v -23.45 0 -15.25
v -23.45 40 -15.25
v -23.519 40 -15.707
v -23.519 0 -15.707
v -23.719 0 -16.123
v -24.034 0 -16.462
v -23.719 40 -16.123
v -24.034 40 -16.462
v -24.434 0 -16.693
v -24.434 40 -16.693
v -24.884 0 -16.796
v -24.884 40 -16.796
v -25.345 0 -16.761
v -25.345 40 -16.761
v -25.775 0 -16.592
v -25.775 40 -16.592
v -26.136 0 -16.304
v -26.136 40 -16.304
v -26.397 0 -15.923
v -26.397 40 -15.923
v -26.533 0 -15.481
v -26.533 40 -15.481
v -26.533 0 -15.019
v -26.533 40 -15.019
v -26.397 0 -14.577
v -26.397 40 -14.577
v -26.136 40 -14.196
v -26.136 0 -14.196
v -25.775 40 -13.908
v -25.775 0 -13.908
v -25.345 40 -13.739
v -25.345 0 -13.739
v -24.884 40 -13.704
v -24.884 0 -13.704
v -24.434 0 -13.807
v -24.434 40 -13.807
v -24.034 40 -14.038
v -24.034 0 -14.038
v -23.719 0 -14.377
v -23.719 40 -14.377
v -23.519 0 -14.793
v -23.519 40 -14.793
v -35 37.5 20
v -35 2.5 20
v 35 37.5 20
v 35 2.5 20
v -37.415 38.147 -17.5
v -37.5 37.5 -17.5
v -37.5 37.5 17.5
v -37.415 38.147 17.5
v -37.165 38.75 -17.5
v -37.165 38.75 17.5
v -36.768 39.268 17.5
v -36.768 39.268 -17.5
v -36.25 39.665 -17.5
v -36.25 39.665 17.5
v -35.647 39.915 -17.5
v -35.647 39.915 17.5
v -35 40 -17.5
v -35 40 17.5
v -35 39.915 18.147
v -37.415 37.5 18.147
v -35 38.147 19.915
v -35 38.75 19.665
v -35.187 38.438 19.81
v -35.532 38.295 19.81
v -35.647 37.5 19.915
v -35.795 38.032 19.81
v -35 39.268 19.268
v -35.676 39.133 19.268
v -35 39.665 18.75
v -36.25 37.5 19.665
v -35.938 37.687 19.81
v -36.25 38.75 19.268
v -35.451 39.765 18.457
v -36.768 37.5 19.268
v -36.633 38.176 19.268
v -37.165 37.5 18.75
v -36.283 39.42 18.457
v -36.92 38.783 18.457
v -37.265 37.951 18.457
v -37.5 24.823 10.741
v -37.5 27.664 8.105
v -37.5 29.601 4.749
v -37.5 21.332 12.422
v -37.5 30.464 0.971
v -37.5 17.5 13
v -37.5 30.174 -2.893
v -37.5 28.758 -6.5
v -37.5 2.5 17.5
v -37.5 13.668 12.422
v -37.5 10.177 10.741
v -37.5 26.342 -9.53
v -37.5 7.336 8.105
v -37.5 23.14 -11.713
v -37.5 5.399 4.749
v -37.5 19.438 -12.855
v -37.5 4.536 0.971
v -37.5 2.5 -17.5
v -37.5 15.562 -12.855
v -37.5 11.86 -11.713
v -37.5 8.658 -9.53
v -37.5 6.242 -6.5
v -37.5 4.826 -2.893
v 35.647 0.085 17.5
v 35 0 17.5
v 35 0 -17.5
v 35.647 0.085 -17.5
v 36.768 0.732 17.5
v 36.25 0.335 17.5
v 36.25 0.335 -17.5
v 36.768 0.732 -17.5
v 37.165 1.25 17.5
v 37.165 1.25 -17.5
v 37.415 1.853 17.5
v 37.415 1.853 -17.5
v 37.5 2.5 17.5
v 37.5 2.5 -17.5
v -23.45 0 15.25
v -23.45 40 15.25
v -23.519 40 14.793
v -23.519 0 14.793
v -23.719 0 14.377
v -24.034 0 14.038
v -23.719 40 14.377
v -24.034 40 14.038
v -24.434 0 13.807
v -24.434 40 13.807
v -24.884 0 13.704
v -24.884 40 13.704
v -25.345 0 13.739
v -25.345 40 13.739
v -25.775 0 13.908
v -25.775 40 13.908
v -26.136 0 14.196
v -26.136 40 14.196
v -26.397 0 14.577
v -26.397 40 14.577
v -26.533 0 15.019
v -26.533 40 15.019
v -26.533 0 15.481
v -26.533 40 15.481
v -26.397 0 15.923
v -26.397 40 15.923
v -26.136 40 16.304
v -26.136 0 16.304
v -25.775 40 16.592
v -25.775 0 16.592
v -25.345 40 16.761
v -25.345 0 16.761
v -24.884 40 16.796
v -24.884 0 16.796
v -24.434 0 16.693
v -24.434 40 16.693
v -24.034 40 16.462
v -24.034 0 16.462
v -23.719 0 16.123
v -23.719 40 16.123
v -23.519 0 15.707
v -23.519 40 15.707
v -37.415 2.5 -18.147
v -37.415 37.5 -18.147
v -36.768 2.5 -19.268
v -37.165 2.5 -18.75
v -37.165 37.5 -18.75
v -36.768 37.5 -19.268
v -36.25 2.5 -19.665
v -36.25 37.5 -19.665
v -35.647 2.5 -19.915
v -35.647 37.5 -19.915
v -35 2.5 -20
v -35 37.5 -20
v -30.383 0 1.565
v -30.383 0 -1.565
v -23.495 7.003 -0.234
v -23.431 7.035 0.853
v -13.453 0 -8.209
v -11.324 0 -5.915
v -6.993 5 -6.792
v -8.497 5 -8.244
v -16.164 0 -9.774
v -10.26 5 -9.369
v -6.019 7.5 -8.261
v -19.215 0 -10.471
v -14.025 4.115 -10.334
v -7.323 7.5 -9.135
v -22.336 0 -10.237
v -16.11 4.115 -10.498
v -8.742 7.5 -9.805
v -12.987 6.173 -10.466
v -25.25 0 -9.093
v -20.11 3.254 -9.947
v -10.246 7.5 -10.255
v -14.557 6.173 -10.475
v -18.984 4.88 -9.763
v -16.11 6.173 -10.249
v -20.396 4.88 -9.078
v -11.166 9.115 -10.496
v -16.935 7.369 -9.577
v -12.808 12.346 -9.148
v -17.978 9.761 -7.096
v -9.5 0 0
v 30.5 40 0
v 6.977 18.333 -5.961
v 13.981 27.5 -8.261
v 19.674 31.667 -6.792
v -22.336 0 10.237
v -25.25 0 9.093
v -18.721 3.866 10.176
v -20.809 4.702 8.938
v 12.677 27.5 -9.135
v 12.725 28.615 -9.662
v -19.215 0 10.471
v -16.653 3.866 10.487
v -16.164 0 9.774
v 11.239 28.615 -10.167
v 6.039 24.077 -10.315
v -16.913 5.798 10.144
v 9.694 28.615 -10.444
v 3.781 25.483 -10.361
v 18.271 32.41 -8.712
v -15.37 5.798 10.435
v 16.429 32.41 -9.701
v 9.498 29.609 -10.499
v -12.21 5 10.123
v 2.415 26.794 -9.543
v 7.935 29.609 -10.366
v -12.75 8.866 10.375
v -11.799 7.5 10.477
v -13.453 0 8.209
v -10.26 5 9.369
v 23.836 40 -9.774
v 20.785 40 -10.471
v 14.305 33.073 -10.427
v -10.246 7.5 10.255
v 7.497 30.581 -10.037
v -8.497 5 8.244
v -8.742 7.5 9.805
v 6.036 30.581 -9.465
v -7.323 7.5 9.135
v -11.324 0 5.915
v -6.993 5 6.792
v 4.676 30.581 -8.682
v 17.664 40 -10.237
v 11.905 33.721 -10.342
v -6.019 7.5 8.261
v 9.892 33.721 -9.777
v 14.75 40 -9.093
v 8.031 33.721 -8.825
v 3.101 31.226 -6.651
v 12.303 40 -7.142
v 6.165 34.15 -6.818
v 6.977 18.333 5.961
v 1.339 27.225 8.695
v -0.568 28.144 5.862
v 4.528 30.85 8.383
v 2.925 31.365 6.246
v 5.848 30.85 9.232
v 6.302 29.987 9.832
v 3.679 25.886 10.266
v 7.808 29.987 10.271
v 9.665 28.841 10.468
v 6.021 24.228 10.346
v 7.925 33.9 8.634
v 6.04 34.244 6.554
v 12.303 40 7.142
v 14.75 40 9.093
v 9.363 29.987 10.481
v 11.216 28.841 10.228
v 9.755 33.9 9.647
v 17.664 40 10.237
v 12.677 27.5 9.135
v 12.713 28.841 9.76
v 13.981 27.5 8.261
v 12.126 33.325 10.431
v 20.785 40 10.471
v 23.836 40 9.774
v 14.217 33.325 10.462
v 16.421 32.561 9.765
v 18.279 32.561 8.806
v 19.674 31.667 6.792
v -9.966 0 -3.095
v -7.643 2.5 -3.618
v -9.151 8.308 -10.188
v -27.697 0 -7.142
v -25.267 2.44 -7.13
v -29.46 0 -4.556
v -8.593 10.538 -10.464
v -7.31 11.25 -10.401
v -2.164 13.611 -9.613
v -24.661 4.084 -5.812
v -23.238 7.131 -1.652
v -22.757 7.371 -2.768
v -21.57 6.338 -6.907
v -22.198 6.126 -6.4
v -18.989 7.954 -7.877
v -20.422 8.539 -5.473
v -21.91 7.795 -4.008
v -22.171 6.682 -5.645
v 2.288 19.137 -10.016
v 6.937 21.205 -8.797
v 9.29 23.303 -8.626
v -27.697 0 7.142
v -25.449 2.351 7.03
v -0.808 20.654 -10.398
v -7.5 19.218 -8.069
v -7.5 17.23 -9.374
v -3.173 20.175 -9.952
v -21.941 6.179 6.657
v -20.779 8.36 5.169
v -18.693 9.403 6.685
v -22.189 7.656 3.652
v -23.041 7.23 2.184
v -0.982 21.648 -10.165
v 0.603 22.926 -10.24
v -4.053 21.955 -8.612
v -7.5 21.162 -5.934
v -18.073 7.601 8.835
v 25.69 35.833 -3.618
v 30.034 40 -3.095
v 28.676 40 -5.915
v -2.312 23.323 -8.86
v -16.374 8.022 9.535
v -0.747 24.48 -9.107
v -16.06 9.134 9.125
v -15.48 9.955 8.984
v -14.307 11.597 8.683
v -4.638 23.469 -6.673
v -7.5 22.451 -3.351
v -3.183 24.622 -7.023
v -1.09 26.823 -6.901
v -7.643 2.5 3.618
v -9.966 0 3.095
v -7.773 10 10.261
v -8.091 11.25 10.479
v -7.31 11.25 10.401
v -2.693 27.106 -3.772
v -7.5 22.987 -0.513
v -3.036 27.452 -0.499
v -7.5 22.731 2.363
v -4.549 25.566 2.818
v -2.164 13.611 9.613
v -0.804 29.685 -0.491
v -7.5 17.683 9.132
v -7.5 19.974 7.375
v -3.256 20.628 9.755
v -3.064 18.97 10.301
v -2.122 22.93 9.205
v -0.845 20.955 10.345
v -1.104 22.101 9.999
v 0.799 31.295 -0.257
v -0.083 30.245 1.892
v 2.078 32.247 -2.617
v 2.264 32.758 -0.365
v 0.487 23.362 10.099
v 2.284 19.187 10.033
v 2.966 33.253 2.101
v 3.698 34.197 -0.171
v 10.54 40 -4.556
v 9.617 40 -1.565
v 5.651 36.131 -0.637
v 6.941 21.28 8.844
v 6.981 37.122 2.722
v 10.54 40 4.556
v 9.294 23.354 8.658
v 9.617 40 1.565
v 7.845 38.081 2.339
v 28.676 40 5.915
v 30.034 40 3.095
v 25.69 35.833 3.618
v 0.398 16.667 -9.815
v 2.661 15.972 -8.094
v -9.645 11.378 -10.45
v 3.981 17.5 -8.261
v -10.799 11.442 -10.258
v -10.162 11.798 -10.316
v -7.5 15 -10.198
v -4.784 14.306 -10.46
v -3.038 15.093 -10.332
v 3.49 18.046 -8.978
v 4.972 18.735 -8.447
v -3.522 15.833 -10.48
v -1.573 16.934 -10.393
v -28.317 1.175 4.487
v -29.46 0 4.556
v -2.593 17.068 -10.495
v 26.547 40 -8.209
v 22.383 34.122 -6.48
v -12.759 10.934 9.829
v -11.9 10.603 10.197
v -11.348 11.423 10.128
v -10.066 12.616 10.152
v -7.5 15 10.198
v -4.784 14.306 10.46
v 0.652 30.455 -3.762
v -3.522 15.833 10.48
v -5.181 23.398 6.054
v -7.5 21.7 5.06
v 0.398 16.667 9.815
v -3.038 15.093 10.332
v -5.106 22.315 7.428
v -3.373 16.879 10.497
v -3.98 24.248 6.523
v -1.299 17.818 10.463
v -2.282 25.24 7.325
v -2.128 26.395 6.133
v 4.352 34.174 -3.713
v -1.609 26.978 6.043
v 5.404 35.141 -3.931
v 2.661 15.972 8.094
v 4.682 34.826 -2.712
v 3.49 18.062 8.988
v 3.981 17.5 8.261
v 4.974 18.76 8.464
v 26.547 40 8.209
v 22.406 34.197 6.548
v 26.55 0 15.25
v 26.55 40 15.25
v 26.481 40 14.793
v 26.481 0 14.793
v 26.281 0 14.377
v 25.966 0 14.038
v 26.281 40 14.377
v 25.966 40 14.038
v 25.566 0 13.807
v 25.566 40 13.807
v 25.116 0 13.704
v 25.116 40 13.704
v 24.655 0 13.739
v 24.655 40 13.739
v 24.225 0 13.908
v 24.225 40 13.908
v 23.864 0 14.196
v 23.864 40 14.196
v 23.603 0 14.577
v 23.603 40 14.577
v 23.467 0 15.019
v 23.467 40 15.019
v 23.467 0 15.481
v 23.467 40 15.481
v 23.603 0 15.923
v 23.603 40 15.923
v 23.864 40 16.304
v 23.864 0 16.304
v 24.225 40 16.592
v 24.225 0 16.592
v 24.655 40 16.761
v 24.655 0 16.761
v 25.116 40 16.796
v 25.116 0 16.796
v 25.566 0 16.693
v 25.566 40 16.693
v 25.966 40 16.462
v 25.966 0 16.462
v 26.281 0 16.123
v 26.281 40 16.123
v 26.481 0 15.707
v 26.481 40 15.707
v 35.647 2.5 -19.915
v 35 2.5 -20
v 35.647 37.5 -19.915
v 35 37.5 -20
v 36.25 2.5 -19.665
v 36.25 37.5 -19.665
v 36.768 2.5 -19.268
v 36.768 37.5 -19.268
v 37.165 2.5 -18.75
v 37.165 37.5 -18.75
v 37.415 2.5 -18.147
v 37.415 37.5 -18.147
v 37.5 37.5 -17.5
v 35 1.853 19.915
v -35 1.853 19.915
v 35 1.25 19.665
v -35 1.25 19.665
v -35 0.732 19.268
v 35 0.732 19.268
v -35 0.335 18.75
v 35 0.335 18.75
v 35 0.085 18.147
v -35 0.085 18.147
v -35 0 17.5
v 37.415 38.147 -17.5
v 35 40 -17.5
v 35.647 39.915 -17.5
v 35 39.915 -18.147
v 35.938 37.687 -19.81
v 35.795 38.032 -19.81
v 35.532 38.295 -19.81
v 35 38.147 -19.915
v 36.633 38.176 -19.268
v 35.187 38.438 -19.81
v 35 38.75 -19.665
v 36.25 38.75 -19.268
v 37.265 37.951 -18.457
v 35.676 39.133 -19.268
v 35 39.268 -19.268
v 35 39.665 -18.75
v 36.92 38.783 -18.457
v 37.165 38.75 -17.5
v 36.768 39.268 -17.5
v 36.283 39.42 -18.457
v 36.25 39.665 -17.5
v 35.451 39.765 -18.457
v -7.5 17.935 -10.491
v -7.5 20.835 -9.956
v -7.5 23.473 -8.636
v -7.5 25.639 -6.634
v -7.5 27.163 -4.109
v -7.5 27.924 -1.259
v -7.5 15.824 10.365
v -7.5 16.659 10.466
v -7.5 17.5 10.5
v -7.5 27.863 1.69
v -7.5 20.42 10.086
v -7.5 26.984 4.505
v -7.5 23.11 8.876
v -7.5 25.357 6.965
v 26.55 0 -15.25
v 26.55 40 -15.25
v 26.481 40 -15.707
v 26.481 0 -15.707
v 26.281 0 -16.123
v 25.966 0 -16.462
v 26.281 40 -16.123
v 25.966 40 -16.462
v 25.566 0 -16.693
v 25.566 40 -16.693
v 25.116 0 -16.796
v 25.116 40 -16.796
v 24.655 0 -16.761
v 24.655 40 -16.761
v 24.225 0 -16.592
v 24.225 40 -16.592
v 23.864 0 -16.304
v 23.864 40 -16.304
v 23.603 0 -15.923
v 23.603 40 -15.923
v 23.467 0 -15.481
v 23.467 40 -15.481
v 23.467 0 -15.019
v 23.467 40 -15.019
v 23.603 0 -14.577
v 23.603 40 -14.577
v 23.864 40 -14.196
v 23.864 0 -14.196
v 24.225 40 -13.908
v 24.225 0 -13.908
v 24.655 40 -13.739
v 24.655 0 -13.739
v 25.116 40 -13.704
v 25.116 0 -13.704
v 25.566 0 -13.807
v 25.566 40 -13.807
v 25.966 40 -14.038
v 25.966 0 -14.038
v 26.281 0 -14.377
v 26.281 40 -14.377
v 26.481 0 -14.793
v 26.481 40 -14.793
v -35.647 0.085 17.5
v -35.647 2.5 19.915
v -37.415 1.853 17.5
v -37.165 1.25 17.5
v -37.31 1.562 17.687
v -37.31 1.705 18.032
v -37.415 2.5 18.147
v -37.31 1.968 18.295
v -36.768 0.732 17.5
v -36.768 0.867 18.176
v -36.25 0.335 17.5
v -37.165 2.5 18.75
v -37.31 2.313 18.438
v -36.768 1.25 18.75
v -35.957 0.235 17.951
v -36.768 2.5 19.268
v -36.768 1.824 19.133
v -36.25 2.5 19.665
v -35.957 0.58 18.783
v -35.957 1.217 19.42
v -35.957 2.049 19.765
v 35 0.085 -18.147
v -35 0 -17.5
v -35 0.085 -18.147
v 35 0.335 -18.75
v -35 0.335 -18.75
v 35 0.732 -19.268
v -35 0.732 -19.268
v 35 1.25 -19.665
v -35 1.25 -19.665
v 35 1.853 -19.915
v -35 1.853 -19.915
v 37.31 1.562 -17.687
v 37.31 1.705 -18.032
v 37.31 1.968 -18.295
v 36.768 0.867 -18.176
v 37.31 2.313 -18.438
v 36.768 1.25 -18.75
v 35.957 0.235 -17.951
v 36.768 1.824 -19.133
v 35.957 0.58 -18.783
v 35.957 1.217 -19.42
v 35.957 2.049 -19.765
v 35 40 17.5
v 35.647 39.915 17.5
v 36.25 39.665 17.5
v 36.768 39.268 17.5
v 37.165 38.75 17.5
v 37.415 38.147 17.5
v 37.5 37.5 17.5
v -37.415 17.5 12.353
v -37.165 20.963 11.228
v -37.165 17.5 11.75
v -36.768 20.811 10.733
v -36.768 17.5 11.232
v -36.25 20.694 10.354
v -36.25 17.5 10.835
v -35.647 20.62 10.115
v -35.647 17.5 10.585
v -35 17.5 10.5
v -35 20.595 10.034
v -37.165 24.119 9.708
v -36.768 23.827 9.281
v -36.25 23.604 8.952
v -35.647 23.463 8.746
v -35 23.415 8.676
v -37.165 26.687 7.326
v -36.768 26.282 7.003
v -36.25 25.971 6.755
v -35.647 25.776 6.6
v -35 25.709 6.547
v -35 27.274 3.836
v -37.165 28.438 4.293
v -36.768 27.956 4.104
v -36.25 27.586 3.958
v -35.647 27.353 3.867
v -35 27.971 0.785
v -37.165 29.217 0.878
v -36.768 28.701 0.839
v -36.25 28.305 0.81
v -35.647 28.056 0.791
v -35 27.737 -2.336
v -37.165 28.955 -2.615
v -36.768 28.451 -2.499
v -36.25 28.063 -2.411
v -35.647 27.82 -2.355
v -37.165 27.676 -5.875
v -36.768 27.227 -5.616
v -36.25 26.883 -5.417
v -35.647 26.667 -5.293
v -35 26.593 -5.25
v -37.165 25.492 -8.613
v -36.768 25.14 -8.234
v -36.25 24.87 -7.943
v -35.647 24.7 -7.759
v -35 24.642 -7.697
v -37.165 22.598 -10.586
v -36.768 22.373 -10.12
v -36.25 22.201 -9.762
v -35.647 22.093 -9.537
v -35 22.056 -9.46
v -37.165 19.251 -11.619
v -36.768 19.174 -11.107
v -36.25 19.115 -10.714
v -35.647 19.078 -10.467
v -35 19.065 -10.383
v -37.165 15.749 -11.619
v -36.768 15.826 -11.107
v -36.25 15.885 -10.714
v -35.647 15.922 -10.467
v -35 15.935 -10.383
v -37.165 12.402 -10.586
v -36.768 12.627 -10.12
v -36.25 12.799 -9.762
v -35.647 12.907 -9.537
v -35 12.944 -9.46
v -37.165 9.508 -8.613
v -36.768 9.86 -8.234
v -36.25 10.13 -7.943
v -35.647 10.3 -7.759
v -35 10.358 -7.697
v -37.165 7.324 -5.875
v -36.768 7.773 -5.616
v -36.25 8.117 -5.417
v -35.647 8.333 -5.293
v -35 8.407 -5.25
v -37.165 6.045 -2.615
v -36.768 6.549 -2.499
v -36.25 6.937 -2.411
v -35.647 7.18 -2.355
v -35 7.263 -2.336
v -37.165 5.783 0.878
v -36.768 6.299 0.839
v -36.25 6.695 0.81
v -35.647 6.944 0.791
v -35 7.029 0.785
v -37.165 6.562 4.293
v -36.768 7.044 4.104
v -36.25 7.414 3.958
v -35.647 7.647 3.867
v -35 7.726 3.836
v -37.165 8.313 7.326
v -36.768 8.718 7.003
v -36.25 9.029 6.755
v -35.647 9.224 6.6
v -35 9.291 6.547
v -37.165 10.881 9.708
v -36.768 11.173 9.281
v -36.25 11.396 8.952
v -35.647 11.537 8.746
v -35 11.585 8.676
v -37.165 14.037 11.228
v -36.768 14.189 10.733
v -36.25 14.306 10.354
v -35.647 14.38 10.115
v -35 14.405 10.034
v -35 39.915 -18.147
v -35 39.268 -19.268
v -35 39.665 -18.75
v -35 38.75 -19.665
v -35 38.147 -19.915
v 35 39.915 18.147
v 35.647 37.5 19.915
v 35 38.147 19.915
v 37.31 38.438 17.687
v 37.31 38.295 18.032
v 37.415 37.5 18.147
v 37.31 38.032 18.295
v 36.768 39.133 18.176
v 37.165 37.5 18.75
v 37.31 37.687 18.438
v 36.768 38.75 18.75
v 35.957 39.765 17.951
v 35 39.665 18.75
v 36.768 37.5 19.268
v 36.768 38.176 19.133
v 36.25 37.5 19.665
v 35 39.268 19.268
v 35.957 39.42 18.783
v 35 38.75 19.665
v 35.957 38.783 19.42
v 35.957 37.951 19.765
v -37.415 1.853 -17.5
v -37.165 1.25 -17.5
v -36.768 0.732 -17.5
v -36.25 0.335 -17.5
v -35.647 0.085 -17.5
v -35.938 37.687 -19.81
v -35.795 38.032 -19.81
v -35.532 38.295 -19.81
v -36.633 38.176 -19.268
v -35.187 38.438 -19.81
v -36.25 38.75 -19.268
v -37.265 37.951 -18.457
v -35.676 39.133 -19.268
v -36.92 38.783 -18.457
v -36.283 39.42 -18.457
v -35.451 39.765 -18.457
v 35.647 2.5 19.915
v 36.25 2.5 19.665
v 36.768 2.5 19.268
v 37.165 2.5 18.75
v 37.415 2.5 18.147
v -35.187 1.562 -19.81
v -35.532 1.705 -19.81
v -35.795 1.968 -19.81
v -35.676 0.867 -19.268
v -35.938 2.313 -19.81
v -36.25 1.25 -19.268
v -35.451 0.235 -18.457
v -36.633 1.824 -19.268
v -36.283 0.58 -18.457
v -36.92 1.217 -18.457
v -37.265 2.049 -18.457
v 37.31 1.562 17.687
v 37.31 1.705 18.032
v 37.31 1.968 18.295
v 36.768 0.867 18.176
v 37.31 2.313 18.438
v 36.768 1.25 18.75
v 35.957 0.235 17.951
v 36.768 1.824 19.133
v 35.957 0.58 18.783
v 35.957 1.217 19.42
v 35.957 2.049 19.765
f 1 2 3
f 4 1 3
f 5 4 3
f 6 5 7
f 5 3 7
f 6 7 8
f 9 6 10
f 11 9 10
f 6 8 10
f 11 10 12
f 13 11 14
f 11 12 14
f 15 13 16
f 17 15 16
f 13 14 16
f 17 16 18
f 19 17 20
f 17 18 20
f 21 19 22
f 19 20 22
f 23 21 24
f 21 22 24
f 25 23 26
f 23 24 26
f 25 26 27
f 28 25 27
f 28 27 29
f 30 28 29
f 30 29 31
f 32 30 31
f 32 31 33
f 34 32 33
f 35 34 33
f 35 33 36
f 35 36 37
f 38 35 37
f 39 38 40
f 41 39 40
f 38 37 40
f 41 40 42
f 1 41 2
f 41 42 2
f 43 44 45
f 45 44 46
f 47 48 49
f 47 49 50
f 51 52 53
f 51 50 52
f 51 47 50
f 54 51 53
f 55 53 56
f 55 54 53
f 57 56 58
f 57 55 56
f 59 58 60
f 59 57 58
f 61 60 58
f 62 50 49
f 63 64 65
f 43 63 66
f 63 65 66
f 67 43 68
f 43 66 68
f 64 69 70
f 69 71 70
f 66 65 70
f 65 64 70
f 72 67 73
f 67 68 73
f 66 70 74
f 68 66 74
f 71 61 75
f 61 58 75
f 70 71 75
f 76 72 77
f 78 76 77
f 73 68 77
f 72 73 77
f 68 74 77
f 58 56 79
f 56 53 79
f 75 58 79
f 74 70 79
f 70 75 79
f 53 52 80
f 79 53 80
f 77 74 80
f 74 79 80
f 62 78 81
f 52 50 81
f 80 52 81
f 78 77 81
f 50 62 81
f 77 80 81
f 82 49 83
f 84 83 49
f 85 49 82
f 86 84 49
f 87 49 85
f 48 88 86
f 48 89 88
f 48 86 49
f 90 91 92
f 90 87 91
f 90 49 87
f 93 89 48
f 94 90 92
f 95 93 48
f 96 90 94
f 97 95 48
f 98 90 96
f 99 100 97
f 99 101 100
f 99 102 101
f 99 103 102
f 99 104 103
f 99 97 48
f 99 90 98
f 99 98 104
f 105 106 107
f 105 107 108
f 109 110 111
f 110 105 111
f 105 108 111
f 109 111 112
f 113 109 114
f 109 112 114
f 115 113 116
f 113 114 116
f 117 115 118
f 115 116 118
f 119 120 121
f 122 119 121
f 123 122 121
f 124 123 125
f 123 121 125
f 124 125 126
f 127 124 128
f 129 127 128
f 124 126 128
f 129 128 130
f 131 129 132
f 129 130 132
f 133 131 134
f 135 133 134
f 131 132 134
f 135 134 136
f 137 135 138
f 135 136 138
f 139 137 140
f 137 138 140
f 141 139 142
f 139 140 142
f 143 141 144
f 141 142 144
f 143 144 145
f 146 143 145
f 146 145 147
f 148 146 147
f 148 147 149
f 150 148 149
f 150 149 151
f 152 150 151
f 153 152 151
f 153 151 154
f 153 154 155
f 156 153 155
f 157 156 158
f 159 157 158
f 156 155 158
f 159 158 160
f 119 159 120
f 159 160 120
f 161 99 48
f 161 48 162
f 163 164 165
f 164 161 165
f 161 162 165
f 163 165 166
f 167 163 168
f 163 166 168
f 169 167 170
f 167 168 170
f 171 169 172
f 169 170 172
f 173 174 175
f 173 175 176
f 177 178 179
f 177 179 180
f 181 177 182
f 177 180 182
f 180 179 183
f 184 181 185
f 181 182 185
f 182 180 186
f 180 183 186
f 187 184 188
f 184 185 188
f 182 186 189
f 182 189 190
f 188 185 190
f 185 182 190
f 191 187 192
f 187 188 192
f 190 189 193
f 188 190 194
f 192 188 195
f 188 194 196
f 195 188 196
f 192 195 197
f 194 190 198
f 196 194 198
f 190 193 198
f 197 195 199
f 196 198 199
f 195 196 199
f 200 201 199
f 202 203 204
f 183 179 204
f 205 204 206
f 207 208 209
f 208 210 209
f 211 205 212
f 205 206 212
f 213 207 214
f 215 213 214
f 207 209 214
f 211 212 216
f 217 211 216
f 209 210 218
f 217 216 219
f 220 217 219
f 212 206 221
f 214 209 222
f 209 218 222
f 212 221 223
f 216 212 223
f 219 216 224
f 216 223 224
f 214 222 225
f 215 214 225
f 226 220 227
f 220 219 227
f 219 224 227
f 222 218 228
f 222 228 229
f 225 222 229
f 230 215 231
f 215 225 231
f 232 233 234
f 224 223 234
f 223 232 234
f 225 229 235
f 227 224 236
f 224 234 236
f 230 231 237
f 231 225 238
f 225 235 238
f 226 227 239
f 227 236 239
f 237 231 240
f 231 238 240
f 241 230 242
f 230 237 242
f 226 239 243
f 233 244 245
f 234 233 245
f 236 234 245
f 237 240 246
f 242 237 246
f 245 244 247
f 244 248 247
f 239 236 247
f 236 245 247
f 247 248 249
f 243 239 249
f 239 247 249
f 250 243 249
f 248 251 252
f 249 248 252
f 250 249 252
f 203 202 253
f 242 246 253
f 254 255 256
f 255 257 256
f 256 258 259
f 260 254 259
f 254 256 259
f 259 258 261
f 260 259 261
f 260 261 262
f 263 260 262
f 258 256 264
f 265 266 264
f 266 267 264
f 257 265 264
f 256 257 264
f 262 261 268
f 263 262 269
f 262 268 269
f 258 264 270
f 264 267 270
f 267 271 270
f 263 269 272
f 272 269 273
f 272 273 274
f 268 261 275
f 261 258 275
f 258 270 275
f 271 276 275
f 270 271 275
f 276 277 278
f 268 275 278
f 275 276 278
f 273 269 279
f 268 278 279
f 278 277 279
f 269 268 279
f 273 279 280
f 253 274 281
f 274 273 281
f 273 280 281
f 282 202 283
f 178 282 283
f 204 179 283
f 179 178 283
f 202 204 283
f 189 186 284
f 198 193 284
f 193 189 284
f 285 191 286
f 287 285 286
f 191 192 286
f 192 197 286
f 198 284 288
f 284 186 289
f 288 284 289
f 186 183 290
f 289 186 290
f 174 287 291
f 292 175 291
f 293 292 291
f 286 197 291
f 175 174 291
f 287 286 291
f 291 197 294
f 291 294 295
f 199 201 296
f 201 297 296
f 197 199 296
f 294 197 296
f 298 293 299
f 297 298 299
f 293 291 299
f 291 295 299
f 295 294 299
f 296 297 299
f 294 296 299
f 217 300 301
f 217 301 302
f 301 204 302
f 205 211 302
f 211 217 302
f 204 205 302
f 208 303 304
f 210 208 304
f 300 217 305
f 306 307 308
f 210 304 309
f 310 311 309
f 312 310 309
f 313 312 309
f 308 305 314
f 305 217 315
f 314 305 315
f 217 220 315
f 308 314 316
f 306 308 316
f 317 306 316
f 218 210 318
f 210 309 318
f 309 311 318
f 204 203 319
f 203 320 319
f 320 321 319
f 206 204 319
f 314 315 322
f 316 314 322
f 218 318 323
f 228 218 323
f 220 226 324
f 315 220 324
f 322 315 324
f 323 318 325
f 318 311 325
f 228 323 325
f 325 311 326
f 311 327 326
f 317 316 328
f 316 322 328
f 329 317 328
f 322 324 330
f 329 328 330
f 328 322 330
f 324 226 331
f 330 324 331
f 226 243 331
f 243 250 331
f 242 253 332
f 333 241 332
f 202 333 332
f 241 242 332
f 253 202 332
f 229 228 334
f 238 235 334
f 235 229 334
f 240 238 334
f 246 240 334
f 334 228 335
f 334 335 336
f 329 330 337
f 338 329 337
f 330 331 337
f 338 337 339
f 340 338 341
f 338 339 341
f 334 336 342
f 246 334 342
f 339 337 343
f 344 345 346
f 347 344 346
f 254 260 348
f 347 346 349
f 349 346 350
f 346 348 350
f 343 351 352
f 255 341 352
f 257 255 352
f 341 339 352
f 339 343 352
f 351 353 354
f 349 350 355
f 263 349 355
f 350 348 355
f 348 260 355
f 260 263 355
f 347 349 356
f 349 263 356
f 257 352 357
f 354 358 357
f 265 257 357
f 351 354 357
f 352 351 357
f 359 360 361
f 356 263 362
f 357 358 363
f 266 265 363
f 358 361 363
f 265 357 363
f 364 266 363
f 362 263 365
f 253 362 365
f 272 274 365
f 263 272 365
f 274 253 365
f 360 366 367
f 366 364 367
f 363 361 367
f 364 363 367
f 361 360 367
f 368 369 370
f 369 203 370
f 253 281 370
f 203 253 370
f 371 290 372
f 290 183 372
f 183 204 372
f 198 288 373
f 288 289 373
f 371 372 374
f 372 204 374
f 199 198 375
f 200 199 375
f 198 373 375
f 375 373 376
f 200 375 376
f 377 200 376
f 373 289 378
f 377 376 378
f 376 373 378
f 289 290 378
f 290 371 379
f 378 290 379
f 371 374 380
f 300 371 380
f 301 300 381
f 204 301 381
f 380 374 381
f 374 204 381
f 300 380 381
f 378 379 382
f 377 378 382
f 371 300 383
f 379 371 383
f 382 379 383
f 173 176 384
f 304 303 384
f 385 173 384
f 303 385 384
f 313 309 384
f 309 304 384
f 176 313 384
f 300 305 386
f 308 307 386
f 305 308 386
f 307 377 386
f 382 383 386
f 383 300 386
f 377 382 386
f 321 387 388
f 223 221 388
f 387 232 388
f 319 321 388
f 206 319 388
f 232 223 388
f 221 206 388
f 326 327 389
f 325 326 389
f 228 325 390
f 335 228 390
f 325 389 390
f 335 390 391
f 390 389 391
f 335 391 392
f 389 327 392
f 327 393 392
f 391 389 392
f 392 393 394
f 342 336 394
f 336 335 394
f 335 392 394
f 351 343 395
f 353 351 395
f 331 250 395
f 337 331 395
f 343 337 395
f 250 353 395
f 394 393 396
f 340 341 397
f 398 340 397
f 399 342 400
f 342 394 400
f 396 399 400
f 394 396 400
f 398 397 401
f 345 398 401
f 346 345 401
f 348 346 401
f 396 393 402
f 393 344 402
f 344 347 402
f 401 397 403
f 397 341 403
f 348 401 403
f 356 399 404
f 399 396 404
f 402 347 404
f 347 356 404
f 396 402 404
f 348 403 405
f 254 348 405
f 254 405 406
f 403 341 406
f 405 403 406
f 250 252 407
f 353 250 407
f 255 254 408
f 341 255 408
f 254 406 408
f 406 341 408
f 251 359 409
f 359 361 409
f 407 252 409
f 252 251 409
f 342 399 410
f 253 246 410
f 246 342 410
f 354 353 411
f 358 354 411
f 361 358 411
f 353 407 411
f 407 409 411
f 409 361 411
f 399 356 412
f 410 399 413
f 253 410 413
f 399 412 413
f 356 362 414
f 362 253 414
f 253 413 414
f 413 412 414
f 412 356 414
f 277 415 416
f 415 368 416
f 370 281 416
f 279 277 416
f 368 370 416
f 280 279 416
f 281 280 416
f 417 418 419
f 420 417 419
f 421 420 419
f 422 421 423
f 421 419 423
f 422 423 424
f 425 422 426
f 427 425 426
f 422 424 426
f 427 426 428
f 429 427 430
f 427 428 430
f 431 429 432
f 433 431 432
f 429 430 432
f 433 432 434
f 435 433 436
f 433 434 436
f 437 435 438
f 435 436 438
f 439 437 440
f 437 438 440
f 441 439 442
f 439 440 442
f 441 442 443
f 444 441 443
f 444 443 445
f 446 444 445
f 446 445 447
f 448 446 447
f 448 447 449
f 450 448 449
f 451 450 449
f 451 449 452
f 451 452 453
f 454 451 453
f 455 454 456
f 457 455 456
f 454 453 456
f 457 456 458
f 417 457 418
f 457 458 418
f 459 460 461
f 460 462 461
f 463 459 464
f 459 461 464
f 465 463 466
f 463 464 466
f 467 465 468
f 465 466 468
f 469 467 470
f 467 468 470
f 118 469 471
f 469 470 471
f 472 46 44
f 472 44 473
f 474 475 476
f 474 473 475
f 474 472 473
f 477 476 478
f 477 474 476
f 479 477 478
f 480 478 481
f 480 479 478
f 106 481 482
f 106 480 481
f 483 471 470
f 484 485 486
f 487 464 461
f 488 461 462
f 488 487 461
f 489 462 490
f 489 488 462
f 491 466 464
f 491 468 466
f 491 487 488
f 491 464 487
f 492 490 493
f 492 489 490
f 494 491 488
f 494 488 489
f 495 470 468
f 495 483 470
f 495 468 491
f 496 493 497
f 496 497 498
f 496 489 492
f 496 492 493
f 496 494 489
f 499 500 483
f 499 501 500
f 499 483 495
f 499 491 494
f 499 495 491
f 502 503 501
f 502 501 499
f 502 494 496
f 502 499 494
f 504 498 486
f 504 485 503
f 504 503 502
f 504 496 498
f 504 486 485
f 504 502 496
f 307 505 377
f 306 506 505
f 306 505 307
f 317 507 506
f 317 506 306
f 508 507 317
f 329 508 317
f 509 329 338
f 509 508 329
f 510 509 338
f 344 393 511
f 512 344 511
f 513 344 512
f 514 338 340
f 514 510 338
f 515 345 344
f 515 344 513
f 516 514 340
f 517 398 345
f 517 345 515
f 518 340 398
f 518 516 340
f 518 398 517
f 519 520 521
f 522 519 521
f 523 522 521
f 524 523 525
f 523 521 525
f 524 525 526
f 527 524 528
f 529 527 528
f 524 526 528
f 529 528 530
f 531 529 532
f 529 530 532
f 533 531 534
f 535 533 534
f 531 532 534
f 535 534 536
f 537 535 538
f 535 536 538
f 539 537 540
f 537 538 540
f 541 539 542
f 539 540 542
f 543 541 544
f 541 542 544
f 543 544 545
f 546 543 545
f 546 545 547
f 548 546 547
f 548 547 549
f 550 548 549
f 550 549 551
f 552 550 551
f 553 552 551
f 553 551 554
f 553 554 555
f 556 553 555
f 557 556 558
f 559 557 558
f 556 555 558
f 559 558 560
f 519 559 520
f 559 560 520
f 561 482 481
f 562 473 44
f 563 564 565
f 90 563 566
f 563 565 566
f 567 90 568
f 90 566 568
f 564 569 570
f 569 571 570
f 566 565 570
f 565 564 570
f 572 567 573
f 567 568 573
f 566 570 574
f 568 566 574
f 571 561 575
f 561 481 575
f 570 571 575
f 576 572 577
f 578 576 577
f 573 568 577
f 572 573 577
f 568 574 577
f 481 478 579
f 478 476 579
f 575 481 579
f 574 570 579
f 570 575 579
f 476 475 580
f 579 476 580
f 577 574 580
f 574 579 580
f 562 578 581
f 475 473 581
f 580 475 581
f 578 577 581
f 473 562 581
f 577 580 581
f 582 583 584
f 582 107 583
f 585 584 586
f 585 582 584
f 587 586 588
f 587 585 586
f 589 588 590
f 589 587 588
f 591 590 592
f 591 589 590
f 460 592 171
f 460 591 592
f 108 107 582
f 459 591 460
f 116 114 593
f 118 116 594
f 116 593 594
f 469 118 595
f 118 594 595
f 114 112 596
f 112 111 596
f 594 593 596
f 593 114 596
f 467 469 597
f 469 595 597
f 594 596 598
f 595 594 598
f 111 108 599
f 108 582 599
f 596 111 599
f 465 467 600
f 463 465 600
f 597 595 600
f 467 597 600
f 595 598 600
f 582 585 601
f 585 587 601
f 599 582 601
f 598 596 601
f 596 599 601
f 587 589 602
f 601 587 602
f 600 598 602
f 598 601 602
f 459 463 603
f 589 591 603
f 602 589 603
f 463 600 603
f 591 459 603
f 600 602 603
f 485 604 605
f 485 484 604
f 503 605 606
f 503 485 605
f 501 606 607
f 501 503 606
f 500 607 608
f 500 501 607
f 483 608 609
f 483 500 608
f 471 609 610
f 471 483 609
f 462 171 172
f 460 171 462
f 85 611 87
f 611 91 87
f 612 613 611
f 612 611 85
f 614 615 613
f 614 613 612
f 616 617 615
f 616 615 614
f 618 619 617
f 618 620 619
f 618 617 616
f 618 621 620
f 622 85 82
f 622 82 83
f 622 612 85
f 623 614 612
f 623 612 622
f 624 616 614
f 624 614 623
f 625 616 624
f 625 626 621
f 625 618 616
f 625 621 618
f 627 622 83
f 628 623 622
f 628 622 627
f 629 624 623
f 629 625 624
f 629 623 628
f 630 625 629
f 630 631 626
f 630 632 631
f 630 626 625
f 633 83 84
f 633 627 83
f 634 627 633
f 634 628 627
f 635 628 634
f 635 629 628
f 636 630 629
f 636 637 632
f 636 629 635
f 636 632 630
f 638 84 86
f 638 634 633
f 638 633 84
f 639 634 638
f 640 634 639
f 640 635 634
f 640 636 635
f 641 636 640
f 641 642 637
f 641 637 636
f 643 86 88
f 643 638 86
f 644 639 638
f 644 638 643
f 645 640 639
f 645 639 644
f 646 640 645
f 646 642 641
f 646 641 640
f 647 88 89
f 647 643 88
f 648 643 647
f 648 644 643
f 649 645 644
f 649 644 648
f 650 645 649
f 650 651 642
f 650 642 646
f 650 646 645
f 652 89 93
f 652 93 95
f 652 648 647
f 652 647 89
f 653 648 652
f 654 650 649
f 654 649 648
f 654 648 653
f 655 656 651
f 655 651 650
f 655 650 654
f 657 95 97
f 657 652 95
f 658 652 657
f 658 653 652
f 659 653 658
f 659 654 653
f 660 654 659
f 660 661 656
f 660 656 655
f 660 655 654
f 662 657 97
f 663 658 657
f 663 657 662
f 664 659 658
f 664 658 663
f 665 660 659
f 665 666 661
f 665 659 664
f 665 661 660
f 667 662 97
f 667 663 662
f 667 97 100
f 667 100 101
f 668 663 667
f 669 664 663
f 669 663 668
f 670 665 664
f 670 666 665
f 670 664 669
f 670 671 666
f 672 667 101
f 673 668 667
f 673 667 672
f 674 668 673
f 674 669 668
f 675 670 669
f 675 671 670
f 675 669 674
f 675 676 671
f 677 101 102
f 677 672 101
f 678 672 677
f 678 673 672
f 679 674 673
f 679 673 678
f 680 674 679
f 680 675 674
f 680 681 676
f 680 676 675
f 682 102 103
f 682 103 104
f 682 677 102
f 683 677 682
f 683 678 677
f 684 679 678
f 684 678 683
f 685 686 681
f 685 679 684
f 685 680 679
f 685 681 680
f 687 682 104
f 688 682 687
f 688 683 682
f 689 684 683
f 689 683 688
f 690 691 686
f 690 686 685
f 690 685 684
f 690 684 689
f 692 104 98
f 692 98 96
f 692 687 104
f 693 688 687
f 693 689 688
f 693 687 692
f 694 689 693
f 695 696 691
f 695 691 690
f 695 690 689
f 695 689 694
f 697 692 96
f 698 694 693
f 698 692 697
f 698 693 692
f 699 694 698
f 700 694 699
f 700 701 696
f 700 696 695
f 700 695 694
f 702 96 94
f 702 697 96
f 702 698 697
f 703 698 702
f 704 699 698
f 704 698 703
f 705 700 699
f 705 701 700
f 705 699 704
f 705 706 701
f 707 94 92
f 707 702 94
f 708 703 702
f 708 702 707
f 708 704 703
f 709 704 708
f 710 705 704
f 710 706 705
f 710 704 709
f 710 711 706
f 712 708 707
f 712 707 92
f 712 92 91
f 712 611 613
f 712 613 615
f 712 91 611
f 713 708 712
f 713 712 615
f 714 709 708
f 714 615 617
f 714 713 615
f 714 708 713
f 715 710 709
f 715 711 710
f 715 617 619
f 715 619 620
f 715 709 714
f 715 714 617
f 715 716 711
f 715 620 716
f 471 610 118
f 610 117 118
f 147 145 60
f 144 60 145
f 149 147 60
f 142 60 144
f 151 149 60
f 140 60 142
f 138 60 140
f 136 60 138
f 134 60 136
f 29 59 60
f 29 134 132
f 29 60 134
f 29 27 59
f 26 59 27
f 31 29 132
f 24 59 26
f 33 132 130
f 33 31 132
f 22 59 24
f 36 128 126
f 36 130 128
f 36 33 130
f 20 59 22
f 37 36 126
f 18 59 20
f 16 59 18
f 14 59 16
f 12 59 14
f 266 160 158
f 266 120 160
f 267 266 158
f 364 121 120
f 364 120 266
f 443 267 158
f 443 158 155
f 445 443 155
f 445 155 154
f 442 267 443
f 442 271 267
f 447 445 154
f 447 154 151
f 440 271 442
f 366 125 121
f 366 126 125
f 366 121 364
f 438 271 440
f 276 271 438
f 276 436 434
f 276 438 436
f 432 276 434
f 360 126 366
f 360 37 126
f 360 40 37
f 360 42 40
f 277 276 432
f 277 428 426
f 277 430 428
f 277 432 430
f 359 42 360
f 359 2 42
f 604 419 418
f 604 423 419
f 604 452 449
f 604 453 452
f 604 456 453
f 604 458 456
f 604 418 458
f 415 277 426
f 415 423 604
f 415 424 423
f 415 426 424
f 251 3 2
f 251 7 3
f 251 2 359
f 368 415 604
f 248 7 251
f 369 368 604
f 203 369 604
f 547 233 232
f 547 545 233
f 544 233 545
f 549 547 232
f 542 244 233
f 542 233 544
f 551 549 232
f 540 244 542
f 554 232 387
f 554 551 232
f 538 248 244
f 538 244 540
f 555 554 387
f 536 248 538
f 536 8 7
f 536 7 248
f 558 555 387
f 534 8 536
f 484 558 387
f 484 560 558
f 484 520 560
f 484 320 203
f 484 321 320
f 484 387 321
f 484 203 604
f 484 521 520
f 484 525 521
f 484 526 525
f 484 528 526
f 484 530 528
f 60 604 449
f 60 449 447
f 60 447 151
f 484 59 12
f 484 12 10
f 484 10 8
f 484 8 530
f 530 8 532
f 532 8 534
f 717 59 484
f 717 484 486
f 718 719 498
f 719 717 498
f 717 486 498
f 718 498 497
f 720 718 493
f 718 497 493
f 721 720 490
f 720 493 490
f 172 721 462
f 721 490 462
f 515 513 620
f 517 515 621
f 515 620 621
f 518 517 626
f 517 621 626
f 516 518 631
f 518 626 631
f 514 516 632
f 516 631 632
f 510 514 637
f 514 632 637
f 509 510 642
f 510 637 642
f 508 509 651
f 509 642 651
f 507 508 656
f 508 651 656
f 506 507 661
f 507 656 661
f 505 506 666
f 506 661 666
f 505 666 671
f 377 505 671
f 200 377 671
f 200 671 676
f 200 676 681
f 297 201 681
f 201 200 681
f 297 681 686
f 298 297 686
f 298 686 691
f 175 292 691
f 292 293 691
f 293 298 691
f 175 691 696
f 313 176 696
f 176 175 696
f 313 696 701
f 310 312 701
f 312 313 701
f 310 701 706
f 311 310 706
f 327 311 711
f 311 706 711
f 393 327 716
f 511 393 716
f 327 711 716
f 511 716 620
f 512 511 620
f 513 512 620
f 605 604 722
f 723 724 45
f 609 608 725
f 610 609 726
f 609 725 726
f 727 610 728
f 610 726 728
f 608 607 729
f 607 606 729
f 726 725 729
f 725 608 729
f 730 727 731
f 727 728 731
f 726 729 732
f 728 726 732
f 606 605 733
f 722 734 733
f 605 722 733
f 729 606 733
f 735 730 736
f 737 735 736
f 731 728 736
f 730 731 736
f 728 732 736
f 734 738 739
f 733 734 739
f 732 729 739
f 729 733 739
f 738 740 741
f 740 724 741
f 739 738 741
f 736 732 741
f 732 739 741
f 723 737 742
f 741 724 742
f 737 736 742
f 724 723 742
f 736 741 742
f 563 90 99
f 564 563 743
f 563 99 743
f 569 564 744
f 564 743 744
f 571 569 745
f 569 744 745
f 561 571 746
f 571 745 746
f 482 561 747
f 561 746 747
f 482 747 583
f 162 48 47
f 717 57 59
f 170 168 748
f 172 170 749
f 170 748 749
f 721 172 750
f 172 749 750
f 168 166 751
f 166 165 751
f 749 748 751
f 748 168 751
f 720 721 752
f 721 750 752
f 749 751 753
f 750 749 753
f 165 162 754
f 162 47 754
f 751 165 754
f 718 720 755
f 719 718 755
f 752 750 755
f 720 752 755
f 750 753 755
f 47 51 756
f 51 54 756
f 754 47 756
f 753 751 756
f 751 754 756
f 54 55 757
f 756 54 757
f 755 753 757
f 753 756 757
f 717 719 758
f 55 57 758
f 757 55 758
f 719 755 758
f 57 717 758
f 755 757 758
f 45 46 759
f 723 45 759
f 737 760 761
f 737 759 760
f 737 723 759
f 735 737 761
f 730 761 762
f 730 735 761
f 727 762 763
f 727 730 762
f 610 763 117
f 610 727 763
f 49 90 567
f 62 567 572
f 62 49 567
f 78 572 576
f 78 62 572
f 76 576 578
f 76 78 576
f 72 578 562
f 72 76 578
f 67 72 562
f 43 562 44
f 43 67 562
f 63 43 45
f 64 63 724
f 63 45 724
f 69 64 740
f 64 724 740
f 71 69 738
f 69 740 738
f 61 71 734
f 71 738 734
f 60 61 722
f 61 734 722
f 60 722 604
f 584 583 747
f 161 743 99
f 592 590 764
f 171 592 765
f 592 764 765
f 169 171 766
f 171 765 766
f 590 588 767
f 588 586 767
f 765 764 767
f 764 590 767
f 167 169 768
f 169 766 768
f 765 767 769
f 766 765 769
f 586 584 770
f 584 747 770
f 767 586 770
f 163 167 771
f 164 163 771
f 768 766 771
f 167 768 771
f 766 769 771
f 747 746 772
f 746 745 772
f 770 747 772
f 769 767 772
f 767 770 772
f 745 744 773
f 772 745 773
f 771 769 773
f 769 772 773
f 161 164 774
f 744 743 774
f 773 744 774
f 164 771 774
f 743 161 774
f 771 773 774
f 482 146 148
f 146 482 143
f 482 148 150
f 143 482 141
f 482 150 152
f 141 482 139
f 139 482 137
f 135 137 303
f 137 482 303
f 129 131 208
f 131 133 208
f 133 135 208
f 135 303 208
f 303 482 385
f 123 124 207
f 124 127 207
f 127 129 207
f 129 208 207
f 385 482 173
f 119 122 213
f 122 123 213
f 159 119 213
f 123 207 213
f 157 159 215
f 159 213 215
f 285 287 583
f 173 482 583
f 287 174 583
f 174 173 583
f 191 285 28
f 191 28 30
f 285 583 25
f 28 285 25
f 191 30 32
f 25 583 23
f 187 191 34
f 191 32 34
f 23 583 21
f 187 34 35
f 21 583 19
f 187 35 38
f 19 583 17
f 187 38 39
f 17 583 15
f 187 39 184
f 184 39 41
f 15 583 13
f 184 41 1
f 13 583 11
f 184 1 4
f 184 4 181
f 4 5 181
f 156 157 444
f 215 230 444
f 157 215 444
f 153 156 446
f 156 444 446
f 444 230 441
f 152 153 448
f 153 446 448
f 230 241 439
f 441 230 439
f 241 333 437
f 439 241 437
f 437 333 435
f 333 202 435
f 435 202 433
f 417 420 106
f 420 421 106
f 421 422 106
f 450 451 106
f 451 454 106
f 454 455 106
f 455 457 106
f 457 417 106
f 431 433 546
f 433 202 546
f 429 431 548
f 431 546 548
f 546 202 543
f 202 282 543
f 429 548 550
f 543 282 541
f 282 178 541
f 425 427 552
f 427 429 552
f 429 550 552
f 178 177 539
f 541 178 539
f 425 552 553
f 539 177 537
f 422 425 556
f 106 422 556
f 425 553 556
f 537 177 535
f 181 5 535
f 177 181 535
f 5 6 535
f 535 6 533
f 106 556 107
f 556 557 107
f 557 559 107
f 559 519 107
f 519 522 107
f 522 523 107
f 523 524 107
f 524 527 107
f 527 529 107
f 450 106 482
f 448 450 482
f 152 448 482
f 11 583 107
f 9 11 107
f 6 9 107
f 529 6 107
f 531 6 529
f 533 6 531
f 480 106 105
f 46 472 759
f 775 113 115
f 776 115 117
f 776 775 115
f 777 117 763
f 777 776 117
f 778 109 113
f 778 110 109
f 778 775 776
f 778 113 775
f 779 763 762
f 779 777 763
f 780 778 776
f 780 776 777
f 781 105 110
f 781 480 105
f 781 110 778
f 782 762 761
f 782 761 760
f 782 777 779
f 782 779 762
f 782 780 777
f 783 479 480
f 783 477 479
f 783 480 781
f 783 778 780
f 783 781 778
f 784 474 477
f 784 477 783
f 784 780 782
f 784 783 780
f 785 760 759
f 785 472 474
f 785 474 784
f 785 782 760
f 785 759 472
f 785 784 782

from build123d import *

# Parameters (mm, degrees)
SKETCH1_W           = 75
SKETCH1_H           = 40
BOSS_EXTRUDE1_DEPTH = 40
SKETCH2_R           = 10.5
CUT_EXTRUDE1_DEPTH  = 30
SKETCH3_R           = 1.55
CUT_EXTRUDE2_DEPTH  = 40
FILLET1_R           = 2.5
SKETCH6_R           = 10.5
SKETCH4_R           = 10.5


with BuildPart() as part:
    # Sketch1 → Boss-Extrude1 (new body)
    with BuildSketch(Plane(origin=(0, 0, 0), x_dir=(1, 0, 0), z_dir=(0, 1, 0))):
        Rectangle(SKETCH1_W, SKETCH1_H)
    extrude(amount=BOSS_EXTRUDE1_DEPTH)

    # Sketch2 → Cut-Extrude1 (cut)
    with BuildSketch(Plane.ZY.offset(37.5)):
        with Locations((0, 17.5)):
            Circle(SKETCH2_R)
    extrude(amount=-CUT_EXTRUDE1_DEPTH, mode=Mode.SUBTRACT)

    # Sketch3 → Cut-Extrude2 (cut)
    with BuildSketch(Plane(origin=(0, 40, 0), x_dir=(1, 0, 0), z_dir=(0, 1, 0))):
        with Locations((-25, 15.25)):
            Circle(SKETCH3_R)
        with Locations((25, 15.25)):
            Circle(SKETCH3_R)
        with Locations((-25, -15.25)):
            Circle(SKETCH3_R)
        with Locations((25, -15.25)):
            Circle(SKETCH3_R)
    extrude(amount=-CUT_EXTRUDE2_DEPTH, mode=Mode.SUBTRACT)

    # Fillet1
    fillet1_edges = [part.edges().sort_by_distance(p)[0] for p in [
        (-37.5, 40, 0),
        (-37.5, 17.5, -10.5),
        (0, 40, 20),
        (37.5, 40, 0),
        (0, 0, 20),
        (-37.5, 0, 0),
        (0, 0, -20),
        (37.5, 0, 0),
        (37.5, 20, 20),
        (-37.5, 20, 20),
        (-37.5, 20, -20),
        (37.5, 20, -20),
        (0, 40, -20),
    ]]
    fillet(fillet1_edges, radius=FILLET1_R)

    # Sketch6 → Cut-Loft1 section 0
    with BuildSketch(Plane(origin=(0, 0, 0), x_dir=(1, 0, 0), z_dir=(0, 1, 0))):
        with Locations((-20, 0)):
            Circle(SKETCH6_R)
    # Sketch4 → Cut-Loft1 section 1
    with BuildSketch(Plane(origin=(0, 40, 0), x_dir=(1, 0, 0), z_dir=(0, 1, 0))):
        with Locations((20, 0)):
            Circle(SKETCH4_R)
    loft(mode=Mode.SUBTRACT)


solid = part.part
